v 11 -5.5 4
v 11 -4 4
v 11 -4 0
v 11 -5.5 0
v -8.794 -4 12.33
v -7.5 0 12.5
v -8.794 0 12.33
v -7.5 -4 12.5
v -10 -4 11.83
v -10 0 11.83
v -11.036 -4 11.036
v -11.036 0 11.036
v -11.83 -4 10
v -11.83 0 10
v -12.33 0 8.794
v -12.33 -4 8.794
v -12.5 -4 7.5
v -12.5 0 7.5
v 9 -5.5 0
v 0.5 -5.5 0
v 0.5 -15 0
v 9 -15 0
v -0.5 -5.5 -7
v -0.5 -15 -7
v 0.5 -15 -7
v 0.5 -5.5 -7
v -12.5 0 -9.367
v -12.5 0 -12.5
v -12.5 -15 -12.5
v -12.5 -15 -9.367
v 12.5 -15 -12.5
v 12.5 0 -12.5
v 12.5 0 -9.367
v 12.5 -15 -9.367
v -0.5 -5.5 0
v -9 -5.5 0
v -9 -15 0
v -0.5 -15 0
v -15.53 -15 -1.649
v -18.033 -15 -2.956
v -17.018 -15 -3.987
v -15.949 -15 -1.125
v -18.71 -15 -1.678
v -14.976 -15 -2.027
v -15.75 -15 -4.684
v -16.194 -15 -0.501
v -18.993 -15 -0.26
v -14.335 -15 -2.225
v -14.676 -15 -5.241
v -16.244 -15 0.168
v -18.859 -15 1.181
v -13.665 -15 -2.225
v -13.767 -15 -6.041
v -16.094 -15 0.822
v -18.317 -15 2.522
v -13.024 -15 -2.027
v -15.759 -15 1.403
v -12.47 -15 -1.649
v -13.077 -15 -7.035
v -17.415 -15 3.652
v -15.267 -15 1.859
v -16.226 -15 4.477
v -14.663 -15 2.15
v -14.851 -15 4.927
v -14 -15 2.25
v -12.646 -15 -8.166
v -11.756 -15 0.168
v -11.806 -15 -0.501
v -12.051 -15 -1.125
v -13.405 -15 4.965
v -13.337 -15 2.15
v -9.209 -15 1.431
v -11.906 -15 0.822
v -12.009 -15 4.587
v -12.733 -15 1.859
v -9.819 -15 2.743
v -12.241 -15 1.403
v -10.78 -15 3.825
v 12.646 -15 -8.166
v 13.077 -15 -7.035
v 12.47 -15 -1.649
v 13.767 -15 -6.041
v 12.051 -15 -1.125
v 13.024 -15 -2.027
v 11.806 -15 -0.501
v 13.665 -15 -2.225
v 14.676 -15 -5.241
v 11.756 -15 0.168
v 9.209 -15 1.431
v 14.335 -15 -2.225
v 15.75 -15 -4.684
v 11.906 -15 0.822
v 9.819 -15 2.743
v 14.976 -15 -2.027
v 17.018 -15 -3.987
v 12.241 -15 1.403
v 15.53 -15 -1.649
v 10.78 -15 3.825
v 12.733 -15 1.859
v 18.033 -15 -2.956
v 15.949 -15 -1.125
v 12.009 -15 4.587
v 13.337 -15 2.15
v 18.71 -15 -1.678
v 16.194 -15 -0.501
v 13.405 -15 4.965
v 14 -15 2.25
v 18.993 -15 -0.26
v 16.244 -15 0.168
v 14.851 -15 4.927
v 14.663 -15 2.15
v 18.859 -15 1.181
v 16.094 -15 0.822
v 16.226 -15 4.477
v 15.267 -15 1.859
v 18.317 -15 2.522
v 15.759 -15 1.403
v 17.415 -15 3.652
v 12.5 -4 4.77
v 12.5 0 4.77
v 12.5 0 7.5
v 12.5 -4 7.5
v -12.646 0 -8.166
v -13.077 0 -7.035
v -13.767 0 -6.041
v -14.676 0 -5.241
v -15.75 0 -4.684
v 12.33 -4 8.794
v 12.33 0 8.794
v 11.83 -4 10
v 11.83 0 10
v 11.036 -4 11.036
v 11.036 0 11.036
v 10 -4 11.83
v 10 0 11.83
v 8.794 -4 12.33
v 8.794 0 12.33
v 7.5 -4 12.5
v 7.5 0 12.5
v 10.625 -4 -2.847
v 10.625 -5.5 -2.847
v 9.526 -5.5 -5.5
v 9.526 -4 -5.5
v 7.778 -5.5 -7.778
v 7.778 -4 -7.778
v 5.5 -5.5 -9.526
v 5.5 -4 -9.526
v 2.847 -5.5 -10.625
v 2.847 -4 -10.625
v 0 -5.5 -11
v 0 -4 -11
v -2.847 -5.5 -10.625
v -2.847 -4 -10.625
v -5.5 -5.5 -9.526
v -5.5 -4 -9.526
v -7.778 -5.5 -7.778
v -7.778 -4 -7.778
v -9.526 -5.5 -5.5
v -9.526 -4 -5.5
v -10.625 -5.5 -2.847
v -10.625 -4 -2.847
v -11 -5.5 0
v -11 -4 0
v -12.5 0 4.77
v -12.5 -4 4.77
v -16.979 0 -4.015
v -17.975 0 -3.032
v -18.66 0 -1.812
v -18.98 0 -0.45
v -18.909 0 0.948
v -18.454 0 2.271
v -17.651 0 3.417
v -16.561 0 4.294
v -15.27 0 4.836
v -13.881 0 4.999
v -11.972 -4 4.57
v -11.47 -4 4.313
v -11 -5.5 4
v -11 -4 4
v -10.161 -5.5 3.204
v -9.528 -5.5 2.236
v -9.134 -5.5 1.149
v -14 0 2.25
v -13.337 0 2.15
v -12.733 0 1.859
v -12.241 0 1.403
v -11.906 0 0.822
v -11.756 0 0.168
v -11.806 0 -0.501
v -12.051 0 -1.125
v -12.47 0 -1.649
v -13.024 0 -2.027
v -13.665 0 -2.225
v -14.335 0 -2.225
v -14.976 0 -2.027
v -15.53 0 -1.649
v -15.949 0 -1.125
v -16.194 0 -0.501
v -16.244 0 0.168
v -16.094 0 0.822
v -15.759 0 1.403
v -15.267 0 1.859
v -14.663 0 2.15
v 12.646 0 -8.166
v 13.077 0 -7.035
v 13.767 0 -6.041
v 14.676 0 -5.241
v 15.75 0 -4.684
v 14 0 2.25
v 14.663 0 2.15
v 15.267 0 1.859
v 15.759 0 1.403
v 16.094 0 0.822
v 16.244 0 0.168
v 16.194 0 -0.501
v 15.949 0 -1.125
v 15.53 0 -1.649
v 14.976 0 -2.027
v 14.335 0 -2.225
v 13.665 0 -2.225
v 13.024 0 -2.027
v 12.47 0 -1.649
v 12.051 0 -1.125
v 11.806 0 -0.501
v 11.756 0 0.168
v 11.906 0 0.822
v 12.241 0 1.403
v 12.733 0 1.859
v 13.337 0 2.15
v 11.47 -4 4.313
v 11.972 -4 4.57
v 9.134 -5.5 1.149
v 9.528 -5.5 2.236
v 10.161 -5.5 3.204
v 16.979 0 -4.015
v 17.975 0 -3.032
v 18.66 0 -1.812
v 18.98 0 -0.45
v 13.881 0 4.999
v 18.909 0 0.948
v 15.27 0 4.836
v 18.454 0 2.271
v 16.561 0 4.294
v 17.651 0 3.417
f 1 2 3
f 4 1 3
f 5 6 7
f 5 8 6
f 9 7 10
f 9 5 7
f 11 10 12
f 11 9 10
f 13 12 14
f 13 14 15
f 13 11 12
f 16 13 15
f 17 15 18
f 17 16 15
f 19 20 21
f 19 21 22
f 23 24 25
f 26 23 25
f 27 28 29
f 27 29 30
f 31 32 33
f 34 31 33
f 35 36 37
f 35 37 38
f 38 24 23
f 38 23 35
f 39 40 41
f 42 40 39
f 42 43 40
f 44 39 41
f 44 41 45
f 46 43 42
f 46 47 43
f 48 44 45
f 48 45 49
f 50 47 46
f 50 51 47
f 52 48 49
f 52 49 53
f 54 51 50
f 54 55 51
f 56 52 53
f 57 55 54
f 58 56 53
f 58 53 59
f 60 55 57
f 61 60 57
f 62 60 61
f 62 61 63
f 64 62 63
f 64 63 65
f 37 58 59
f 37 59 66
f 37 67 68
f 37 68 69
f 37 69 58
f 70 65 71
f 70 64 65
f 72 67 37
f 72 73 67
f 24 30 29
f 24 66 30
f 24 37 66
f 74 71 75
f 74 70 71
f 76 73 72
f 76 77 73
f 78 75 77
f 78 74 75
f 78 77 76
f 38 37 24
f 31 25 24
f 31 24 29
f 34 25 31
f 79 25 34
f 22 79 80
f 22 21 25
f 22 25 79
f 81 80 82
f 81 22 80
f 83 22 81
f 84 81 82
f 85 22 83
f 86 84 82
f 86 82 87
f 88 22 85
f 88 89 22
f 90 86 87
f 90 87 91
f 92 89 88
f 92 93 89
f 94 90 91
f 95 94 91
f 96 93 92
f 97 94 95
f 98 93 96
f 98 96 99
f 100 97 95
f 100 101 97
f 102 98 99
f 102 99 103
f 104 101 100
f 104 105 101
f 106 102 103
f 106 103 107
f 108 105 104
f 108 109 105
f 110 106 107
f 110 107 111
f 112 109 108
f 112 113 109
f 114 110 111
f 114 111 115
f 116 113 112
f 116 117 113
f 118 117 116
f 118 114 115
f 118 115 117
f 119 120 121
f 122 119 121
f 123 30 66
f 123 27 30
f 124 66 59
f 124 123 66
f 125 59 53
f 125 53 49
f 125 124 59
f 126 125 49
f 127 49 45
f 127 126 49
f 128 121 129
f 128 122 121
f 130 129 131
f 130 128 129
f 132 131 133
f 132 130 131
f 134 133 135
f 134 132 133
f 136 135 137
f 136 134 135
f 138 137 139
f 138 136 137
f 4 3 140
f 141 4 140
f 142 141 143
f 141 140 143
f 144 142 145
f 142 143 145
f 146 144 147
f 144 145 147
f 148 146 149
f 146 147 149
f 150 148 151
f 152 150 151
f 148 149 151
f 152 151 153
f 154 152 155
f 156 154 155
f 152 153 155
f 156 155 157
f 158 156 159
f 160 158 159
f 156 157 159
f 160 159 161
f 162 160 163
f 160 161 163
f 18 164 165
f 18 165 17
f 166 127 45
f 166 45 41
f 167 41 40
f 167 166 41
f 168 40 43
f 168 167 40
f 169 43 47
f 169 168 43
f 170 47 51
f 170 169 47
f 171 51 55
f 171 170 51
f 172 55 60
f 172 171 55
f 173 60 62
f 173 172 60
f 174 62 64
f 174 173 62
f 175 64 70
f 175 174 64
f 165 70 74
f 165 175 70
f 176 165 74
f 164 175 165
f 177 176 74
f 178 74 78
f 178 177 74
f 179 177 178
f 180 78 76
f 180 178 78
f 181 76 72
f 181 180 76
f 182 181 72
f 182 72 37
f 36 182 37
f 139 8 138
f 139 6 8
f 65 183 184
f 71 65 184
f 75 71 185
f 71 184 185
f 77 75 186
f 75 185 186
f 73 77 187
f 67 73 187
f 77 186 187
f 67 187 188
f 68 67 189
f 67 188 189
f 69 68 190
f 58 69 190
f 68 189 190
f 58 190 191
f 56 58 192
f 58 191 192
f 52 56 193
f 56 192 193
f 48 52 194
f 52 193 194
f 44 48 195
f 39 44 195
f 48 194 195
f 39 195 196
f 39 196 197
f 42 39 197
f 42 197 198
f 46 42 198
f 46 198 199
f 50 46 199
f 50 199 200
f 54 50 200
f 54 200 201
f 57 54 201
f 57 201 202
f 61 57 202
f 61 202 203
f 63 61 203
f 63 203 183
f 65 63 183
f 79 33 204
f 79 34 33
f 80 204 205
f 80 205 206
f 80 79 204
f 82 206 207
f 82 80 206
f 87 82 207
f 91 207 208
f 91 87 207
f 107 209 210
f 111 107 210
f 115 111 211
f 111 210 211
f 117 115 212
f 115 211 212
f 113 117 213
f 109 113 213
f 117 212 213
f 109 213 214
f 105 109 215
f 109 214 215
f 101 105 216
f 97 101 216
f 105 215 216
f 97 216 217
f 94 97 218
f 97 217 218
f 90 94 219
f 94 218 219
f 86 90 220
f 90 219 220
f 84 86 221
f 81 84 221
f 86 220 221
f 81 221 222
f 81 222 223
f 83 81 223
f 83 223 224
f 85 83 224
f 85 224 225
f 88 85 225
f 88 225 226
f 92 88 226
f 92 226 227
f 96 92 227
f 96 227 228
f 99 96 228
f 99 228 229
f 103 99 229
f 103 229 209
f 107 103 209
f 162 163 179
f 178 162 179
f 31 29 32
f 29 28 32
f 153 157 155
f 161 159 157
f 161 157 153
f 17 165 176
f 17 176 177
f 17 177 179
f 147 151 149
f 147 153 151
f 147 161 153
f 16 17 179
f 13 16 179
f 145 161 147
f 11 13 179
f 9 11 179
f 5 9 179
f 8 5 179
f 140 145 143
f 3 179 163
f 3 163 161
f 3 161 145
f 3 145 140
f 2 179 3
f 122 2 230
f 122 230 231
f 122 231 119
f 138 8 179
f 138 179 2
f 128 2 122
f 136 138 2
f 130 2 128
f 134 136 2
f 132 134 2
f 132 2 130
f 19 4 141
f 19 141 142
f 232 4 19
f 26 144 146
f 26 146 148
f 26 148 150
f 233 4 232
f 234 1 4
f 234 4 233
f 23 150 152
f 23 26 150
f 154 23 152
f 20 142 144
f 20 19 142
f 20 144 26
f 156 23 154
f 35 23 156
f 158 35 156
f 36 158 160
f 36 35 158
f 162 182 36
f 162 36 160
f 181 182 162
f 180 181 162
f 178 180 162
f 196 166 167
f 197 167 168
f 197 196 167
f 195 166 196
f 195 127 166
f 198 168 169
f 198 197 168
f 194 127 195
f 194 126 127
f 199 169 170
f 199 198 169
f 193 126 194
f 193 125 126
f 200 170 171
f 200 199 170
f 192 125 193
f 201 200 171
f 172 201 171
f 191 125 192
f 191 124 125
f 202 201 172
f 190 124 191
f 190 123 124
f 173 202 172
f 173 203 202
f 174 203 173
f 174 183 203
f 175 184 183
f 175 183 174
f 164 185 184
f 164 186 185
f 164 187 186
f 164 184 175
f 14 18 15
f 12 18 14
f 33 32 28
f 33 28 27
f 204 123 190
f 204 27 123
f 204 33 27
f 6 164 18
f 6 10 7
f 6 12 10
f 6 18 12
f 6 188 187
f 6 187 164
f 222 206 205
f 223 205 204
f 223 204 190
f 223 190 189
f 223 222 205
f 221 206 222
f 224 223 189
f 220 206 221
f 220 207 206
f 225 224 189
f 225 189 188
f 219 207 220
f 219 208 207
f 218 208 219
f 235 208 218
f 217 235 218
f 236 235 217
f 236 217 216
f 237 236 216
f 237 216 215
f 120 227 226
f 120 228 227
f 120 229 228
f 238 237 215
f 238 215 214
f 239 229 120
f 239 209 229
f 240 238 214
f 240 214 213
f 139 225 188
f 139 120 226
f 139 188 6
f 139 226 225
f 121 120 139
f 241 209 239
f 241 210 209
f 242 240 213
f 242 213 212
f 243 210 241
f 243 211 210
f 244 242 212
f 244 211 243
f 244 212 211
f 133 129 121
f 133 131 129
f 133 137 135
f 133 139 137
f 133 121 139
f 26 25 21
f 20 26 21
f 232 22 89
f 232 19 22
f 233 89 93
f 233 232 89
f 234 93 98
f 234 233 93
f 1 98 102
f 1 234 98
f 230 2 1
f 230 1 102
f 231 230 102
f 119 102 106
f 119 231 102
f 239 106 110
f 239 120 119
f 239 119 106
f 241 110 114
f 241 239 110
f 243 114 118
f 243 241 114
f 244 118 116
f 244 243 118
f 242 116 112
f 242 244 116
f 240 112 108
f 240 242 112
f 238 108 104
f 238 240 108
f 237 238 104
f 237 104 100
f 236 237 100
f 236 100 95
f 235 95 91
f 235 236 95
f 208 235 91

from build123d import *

# Parameters (mm, degrees)
SKETCH6_W           = 25
SKETCH6_H           = 25
BOSS_EXTRUDE3_DEPTH = 4
SKETCH11_R          = 5
BOSS_EXTRUDE7_DEPTH = 15
SKETCH8_W           = 25
SKETCH8_H           = 12.5
BOSS_EXTRUDE5_DEPTH = 11
SKETCH12_R          = 2.25
CUT_EXTRUDE3_DEPTH  = 28.244265452
SKETCH9_W           = 1
SKETCH9_H           = 7
CUT_EXTRUDE2_DEPTH  = 11
CUT_EXTRUDE4_DEPTH  = 1.5
FILLET2_R           = 5


with BuildPart() as part:
    # Sketch6 → Boss-Extrude3 (new body)
    with BuildSketch(Plane.XZ):
        Rectangle(SKETCH6_W, SKETCH6_H)
    extrude(amount=BOSS_EXTRUDE3_DEPTH)

    # Sketch11 → Boss-Extrude7 (add)
    with BuildSketch(Plane(origin=(0, 0, 0), x_dir=(1, 0, 0), z_dir=(0, 1, 0))):
        with Locations(Location((-14, 0, 0), (0, 0, 270))):
            Circle(SKETCH11_R)
        with Locations(Location((14, 0, 0), (0, 0, 270))):
            Circle(SKETCH11_R)
    extrude(amount=-BOSS_EXTRUDE7_DEPTH)

    # Sketch8 → Boss-Extrude5 (add)
    with BuildSketch(Plane.XZ.offset(4)):
        with Locations((0, -6.25)):
            Rectangle(SKETCH8_W, SKETCH8_H)
    extrude(amount=BOSS_EXTRUDE5_DEPTH)

    # Sketch12 → Cut-Extrude3 (cut, through all)
    with BuildSketch(Plane(origin=(0, 0, 0), x_dir=(1, 0, 0), z_dir=(0, 1, 0))):
        with Locations(Location((-14, 0, 0), (0, 0, 270))):
            Circle(SKETCH12_R)
        with Locations(Location((14, 0, 0), (0, 0, 270))):
            Circle(SKETCH12_R)
    extrude(amount=-CUT_EXTRUDE3_DEPTH, mode=Mode.SUBTRACT)

    # Sketch9 → Cut-Extrude2 (cut)
    with BuildSketch(Plane.XZ.offset(15)):
        with Locations((0, -3.5)):
            Rectangle(SKETCH9_W, SKETCH9_H)
    extrude(amount=-CUT_EXTRUDE2_DEPTH, mode=Mode.SUBTRACT)

    # Sketch13 → Cut-Extrude4 (cut)
    with BuildSketch(Plane.XZ.offset(4)):
        with BuildLine():
            Line((-11, 0), (-11, 12.5))
            Line((-11, 12.5), (11, 12.5))
            Line((11, 12.5), (11, 0))
            ThreePointArc((11, 0), (0, -11), (-11, 0))
        make_face()
    extrude(amount=CUT_EXTRUDE4_DEPTH, mode=Mode.SUBTRACT)

    # Fillet2
    fillet2_edges = [part.edges().sort_by_distance(p)[0] for p in [
        (-12.5, -7.5, -4.769696007),
        (12.5, -7.5, -4.769696007),
        (-12.5, -2, 12.5),
        (12.5, -2, 12.5),
    ]]
    fillet(fillet2_edges, radius=FILLET2_R)


solid = part.part
